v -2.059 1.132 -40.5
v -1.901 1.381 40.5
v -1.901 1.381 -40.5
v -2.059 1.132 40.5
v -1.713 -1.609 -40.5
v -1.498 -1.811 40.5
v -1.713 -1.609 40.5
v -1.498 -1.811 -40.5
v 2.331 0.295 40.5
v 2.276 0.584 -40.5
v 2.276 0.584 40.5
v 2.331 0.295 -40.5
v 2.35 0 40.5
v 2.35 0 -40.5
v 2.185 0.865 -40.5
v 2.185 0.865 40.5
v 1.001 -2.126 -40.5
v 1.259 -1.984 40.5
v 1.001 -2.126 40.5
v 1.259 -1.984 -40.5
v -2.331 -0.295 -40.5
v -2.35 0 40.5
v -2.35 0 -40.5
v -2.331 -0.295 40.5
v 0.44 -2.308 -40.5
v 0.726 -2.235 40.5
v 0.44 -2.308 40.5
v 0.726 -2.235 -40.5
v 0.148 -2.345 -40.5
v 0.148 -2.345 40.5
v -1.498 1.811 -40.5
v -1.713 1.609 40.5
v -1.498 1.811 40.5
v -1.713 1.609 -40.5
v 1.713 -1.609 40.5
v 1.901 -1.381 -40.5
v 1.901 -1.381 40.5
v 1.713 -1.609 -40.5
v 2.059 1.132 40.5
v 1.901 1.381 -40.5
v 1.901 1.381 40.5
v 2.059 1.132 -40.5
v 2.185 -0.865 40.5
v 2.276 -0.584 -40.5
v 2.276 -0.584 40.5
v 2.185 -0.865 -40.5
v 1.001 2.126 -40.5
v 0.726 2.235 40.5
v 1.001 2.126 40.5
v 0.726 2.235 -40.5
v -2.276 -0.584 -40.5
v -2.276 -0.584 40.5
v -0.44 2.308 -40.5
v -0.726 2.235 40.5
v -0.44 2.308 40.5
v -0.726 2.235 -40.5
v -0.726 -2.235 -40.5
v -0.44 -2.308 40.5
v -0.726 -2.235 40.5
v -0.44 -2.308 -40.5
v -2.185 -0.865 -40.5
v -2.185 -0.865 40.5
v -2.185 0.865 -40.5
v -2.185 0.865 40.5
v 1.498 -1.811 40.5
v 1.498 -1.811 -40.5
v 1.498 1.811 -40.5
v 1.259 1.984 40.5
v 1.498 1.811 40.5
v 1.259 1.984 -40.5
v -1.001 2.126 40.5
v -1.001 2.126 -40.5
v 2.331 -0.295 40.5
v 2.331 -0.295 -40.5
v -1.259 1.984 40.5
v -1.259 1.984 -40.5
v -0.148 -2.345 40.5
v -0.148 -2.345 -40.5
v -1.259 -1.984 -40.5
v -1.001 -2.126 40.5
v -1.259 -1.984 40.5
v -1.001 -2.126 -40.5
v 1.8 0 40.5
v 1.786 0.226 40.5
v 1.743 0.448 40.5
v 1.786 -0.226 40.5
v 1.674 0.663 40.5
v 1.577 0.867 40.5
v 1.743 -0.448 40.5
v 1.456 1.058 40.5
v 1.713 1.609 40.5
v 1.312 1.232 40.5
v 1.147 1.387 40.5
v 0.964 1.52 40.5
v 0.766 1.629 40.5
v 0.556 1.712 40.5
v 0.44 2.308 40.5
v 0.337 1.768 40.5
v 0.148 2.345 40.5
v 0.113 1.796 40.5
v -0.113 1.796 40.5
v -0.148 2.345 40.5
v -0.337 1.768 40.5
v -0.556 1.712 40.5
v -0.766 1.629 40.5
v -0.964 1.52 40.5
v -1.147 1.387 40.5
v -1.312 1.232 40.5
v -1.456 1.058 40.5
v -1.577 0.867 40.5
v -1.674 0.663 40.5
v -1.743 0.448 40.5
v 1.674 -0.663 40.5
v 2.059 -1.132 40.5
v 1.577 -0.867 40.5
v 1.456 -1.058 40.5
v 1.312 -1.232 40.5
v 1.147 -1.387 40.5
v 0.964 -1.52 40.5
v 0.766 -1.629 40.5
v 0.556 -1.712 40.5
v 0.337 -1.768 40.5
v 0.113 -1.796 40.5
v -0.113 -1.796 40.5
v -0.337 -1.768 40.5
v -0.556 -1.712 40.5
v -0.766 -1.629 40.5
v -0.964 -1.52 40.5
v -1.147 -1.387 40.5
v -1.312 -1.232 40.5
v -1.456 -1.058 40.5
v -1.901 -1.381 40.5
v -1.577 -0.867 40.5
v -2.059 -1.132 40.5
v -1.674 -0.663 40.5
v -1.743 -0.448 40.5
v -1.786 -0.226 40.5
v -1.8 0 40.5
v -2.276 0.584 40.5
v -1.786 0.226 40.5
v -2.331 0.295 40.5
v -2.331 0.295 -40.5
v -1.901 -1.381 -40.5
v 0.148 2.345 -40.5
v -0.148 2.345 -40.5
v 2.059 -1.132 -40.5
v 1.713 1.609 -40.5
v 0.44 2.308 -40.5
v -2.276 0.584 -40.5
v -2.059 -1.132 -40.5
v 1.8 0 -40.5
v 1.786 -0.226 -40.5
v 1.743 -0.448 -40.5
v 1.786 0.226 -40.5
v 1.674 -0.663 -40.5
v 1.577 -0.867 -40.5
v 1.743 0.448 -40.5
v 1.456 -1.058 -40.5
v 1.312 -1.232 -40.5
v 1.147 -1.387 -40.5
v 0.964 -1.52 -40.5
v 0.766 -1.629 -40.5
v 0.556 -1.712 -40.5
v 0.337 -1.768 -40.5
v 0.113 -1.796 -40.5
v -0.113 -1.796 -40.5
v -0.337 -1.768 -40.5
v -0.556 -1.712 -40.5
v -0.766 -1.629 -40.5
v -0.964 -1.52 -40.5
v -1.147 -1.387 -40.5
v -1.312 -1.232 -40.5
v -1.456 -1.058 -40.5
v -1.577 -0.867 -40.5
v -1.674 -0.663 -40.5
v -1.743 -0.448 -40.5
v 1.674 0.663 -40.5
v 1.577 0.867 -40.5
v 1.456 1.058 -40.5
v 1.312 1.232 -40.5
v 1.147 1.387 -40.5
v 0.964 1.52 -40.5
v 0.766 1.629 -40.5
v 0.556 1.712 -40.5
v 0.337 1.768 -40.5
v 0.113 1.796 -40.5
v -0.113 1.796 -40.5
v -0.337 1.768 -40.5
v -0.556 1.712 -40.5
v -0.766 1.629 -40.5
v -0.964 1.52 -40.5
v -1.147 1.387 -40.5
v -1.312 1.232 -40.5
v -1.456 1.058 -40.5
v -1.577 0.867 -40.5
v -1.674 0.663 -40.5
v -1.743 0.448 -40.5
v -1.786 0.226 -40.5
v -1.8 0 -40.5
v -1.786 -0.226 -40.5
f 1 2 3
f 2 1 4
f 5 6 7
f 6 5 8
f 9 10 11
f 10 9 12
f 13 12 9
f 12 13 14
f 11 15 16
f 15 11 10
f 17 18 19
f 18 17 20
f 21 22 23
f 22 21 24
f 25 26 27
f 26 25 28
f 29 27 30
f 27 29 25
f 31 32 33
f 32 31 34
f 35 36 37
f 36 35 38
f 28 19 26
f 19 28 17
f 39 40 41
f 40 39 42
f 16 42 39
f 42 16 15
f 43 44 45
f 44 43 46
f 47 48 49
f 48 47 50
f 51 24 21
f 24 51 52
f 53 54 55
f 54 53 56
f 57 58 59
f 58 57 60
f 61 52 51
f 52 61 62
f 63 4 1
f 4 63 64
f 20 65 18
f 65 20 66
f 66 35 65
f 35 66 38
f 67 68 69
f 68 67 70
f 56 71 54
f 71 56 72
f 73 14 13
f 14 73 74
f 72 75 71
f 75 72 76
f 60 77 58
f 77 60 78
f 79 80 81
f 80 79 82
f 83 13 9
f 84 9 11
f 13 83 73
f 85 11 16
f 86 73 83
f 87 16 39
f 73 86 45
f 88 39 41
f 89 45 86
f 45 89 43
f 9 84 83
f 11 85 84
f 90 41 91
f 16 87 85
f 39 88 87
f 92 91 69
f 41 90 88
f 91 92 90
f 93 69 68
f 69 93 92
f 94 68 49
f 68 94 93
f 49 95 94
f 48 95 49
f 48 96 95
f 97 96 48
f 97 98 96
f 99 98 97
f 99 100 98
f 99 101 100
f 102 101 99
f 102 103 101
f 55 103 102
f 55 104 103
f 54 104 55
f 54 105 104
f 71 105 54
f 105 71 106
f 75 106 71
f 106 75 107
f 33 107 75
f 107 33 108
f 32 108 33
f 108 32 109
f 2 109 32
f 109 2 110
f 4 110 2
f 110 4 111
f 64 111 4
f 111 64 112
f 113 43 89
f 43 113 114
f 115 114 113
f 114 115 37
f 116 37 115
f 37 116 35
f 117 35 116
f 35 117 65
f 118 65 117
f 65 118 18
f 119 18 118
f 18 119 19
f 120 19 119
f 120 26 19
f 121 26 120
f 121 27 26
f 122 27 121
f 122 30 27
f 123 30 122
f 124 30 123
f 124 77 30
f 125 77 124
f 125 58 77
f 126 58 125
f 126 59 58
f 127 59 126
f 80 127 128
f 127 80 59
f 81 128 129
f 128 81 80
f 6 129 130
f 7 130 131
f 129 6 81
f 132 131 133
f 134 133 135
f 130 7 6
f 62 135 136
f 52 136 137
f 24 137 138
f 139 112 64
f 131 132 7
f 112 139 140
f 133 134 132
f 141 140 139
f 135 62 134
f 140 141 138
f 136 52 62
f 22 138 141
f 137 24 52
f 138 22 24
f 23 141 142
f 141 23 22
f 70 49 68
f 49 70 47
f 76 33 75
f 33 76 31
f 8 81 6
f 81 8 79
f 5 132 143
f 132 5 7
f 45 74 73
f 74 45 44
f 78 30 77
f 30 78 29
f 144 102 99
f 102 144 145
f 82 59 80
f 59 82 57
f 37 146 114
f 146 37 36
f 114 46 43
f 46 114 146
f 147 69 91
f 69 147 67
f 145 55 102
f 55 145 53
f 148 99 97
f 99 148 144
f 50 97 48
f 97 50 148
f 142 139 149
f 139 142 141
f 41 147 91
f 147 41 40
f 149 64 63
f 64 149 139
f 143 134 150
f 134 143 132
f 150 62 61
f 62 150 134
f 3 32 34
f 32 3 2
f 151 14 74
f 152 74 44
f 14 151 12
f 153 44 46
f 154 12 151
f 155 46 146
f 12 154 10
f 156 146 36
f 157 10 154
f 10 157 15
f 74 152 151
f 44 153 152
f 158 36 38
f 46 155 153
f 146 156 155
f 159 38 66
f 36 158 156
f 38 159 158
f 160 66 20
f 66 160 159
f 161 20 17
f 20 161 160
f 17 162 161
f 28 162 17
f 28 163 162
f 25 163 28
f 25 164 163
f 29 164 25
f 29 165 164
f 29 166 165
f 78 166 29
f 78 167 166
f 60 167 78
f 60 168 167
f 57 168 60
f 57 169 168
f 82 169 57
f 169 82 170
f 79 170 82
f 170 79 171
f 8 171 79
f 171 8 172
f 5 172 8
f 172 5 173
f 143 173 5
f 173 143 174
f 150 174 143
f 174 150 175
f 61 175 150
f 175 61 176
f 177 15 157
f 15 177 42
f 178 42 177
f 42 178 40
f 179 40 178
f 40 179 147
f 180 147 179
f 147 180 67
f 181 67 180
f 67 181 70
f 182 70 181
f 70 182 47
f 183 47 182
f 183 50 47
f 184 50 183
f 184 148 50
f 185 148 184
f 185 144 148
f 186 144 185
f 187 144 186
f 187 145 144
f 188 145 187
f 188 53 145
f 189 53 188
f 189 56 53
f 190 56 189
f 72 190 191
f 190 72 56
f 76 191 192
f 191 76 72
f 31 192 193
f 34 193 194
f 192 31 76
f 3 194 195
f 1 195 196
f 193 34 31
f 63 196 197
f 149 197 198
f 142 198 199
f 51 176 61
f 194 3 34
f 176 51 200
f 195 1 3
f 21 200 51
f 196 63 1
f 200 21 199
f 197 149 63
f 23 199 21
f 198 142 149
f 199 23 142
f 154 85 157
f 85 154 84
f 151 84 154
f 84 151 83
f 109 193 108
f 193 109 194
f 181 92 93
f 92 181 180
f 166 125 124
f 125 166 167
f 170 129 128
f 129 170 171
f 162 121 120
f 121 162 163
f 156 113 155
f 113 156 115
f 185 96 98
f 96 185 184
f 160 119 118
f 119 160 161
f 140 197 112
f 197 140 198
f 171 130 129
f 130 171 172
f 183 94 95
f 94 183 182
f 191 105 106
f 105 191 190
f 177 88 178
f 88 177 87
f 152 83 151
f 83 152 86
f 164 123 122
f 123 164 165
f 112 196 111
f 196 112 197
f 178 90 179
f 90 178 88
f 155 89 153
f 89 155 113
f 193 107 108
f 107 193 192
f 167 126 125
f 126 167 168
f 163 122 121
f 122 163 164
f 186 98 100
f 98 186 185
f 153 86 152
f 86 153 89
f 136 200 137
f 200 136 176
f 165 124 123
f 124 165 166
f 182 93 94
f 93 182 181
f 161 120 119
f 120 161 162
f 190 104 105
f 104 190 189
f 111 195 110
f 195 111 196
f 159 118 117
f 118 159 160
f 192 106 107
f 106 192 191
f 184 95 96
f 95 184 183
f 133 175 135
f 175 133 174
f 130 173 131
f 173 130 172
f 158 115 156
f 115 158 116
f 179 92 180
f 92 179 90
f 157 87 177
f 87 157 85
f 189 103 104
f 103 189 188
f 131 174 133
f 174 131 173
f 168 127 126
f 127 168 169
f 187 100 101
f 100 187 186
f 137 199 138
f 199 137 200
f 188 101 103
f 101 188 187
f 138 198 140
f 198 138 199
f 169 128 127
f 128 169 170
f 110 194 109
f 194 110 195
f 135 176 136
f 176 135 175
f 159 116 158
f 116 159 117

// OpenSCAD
$fn = 50;


difference() {
	union() {
		translate(v = [0, 0, -40.5000000000]) {
			cylinder(h = 81, r = 2.3500000000);
		}
	}
	union() {
		#translate(v = [0, 0, -100.0000000000]) {
			cylinder(h = 200, r = 1.8000000000);
		}
	}
}
